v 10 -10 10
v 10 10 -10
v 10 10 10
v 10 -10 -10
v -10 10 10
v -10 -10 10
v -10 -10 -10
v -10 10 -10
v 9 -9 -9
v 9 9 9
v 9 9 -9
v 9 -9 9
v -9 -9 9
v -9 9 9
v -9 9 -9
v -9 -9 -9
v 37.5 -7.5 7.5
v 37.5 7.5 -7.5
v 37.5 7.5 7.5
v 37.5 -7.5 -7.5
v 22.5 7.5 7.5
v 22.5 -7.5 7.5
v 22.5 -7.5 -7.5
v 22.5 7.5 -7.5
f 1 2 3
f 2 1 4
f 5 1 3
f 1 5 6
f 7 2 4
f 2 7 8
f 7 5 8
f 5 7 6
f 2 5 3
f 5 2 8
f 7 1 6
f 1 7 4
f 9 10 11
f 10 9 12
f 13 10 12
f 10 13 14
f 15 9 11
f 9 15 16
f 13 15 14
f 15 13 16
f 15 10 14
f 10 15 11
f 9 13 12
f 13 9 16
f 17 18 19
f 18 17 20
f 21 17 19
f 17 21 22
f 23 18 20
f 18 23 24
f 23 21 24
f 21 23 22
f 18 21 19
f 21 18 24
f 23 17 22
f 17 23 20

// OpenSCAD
// User module + if
module box(s, hollow = false) {
    if (hollow) {
        difference() {
            cube(s, center = true);
            cube(s - 2, center = true);
        }
    } else {
        cube(s, center = true);
    }
}

box(20, hollow = true);
translate([30, 0, 0]) box(15);
